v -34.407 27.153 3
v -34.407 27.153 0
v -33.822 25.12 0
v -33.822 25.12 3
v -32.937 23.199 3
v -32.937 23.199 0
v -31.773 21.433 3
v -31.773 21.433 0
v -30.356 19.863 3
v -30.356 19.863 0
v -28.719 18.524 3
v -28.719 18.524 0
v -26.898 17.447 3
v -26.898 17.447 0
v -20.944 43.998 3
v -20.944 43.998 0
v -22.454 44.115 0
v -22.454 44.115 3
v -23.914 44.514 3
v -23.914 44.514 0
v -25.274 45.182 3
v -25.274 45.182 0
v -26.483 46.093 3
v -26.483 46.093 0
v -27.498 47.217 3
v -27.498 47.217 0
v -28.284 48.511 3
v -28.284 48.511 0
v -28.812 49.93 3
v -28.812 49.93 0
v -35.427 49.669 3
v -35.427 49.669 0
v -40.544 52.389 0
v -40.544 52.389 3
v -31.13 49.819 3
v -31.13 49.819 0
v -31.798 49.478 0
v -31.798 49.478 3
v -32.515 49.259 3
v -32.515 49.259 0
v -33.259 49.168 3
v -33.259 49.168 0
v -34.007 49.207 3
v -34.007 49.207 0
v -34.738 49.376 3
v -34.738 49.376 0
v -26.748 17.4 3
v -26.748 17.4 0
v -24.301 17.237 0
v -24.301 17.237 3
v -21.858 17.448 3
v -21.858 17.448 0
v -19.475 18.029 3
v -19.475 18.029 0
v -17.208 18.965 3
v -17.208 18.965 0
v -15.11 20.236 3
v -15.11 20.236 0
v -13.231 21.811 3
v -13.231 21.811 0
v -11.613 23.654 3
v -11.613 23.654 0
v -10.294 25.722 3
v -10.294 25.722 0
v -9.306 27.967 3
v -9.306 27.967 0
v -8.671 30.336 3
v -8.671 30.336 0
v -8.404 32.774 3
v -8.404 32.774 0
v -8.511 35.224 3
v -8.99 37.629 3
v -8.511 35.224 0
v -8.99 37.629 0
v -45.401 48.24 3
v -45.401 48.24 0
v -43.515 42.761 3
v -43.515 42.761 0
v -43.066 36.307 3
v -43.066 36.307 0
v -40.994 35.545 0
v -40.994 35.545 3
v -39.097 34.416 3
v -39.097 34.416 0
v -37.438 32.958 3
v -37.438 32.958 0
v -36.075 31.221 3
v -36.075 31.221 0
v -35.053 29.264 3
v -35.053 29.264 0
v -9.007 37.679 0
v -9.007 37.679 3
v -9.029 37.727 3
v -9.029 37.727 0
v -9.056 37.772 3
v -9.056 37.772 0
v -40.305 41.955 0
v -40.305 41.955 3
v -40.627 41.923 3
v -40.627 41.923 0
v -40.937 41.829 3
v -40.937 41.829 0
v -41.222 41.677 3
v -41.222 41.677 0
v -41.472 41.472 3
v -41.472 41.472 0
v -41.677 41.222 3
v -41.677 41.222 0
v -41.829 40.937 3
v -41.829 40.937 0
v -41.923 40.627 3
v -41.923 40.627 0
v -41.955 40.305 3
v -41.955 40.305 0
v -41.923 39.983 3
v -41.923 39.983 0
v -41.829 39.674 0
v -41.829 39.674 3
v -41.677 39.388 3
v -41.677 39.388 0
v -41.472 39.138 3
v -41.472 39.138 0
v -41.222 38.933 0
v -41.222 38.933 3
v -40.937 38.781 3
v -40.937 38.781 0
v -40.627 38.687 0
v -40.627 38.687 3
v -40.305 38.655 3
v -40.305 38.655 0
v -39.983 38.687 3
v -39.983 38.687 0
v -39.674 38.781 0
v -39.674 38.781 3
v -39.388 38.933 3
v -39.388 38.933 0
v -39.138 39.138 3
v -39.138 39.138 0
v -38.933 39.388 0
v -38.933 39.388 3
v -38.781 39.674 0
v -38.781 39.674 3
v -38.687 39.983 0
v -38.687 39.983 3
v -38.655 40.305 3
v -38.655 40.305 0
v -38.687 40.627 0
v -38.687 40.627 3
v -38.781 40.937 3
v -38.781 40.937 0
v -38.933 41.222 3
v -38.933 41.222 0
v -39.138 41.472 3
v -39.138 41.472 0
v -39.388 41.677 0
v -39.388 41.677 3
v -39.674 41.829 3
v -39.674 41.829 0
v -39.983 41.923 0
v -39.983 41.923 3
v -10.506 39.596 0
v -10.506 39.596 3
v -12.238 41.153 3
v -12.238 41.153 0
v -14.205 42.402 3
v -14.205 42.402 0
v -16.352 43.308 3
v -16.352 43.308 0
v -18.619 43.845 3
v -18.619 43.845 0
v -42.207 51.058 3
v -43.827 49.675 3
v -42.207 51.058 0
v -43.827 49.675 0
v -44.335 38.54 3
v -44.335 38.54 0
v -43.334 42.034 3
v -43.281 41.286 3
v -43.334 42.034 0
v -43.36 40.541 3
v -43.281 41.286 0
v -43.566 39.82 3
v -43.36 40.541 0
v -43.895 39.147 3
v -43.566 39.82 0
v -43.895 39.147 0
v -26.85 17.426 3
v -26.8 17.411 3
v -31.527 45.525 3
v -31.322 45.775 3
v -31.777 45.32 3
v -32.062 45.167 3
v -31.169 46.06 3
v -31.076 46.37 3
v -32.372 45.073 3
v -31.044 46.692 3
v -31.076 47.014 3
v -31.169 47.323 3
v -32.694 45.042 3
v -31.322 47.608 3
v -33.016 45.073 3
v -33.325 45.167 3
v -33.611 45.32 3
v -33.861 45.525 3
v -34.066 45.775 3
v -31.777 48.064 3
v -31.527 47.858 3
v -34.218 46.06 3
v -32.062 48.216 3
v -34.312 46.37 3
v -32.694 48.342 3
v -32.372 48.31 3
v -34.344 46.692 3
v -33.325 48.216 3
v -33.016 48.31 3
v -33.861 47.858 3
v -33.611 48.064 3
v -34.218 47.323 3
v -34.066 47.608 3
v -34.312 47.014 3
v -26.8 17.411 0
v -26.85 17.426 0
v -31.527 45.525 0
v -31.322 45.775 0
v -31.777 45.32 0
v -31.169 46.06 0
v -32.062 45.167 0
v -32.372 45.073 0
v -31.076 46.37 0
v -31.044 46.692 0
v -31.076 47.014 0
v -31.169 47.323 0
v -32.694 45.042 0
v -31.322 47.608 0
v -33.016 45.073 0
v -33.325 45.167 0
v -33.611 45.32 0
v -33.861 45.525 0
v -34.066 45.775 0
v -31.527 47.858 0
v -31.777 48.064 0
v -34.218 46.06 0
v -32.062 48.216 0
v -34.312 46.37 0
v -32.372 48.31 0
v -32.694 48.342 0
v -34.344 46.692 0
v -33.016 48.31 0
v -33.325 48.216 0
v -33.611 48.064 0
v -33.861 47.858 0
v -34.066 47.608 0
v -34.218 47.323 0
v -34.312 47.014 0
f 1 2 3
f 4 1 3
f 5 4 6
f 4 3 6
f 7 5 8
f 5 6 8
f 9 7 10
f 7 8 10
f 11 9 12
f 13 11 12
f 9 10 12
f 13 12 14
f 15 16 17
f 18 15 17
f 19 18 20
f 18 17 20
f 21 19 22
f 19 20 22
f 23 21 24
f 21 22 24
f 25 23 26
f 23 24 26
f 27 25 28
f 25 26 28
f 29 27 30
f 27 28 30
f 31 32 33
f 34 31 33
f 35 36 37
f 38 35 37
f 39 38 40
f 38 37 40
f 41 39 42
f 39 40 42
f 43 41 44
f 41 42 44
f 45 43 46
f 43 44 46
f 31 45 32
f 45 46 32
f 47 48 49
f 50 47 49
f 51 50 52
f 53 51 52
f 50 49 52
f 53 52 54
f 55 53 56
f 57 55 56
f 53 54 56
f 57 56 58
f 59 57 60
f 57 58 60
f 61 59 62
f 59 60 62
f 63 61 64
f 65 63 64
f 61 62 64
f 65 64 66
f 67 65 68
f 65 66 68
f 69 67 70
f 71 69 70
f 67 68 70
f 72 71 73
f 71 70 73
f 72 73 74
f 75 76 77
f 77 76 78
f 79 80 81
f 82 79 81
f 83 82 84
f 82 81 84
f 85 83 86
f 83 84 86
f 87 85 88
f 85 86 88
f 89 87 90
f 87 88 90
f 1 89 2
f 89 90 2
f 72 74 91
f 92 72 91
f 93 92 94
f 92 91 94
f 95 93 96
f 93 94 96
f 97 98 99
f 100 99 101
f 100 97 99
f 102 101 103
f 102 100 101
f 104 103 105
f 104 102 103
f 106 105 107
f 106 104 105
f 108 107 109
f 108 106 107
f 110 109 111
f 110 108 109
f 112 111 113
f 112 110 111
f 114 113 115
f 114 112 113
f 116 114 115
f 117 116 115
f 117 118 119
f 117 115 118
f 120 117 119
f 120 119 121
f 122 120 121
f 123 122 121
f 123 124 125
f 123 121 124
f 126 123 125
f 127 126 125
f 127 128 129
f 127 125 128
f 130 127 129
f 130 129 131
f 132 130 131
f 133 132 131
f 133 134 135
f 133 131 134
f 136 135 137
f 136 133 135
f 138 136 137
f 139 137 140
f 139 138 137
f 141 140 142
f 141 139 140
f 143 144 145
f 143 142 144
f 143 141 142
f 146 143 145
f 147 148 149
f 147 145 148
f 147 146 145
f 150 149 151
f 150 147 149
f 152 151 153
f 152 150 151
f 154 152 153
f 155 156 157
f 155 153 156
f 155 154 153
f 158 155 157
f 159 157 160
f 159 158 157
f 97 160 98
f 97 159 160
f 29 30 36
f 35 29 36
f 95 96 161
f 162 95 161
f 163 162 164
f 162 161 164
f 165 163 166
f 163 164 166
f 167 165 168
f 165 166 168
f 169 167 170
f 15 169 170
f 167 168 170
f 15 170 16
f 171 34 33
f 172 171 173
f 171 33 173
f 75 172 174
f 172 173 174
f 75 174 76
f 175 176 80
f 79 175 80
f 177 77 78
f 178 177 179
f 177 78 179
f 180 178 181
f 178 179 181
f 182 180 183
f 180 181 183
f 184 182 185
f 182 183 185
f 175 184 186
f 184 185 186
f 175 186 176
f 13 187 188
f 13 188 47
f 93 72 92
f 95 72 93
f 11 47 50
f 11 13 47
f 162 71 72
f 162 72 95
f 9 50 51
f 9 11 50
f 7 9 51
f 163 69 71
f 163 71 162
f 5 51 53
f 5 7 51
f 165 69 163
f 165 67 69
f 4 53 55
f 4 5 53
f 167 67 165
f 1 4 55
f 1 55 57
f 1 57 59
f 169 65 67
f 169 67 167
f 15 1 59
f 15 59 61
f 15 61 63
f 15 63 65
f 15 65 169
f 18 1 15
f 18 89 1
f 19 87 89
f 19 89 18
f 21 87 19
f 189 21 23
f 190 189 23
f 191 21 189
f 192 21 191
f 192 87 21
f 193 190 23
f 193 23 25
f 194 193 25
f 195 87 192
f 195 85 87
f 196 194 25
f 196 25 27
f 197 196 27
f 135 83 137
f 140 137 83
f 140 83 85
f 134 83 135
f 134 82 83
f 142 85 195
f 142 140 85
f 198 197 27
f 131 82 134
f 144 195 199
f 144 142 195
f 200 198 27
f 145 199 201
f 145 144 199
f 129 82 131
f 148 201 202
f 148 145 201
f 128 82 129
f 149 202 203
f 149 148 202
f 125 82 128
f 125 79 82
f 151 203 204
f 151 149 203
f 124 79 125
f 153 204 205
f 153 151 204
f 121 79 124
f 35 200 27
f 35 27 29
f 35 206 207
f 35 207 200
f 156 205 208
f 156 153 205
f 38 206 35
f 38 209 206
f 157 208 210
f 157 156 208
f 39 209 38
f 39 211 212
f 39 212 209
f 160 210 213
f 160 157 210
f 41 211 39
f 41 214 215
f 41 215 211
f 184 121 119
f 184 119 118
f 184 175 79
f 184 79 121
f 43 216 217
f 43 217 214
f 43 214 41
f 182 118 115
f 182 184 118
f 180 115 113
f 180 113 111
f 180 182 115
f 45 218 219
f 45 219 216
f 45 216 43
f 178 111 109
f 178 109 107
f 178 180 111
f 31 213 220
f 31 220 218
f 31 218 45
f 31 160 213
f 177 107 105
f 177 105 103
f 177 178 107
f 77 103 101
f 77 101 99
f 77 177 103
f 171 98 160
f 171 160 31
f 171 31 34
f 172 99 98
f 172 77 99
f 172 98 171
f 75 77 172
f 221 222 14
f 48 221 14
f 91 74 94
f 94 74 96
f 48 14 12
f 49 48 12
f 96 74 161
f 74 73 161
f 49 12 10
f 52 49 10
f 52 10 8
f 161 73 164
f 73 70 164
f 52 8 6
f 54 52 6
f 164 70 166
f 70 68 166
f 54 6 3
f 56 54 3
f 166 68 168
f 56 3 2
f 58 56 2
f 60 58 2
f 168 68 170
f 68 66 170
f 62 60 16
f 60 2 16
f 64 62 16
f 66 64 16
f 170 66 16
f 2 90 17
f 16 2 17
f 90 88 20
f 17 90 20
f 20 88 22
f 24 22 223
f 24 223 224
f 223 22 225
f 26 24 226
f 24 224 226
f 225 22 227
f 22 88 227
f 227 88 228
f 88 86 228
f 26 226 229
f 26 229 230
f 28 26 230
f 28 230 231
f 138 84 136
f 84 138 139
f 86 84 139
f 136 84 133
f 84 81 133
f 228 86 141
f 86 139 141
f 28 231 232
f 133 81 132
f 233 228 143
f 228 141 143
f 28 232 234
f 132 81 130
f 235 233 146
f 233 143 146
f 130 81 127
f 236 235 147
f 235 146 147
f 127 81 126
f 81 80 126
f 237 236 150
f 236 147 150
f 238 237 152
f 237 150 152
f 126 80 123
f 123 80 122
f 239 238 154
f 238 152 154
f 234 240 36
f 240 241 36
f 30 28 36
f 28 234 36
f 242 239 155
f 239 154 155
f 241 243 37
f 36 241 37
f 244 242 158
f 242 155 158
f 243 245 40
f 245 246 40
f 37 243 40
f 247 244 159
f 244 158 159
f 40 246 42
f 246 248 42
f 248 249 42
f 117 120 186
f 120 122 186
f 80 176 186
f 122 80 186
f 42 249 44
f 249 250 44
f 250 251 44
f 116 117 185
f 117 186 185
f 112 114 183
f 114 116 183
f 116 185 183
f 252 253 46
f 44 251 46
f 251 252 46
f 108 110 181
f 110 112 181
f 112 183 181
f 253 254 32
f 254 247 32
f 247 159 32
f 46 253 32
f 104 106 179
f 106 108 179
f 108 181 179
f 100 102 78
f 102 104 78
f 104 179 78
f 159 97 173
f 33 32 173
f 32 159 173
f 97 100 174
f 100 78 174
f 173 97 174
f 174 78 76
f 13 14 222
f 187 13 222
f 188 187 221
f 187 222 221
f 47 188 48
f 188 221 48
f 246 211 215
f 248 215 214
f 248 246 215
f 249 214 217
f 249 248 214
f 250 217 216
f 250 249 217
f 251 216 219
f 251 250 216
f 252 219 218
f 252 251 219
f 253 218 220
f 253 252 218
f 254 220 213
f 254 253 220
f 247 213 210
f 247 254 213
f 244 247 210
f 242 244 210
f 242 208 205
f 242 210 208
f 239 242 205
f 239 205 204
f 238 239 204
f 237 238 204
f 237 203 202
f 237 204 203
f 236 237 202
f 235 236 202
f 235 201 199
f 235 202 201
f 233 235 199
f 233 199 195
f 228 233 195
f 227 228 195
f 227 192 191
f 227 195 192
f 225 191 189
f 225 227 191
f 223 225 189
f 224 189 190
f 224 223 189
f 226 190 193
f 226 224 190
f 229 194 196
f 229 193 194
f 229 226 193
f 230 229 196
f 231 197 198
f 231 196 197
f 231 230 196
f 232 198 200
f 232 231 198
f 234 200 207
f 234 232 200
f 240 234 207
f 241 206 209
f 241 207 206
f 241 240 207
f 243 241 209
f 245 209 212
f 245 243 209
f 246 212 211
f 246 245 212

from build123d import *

# Parameters (mm, degrees)
BOSS_EXTRUDE1_DEPTH     = 115
BOSS_EXTRUDE2_DEPTH     = 3
SKETCH4_R               = 1.65
CUT_EXTRUDE1_DEPTH      = 147.999004413
CUT_EXTRUDE2_DEPTH      = 147.999004413
CUT_EXTRUDE_THIN1_DEPTH = 147.999004413
CUT_EXTRUDE3_DEPTH      = 147.999004413


with BuildPart() as part:
    # Sketch1 → Boss-Extrude1 (new body)
    with BuildSketch(Plane(origin=(0, 0, 0), x_dir=(0, 1, 0), z_dir=(0, 0, 1))):
        with BuildLine():
            Line((66.793011614, 25.63943495), (62.125109481, 23.847595202))
            ThreePointArc((62.125109481, 23.847595202), (50.18784505, 43.696878999), (32.170193606, 58.252173078))
            Line((32.170193606, 58.252173078), (34.587369472, 62.629073903))
            ThreePointArc((34.587369472, 62.629073903), (53.95881545, 46.980136869), (66.793011614, 25.63943495))
        make_face()
    extrude(amount=BOSS_EXTRUDE1_DEPTH)

    # Sketch3 → Boss-Extrude2 (add)
    with BuildSketch(Plane(origin=(0, 0, 0), x_dir=(0, 1, 0), z_dir=(0, 0, 1))):
        with BuildLine():
            ThreePointArc((37.772226983, 9.055581263), (42.402339681, 14.205235152), (43.997873295, 20.944014808))
            ThreePointArc((43.997873295, 20.944014808), (49.930251766, 28.811968202), (58.997685125, 24.954578252))
            ThreePointArc((58.997685125, 24.954578252), (60.351321071, 23.807583941), (62.125109481, 23.847595202))
            ThreePointArc((62.125109481, 23.847595202), (50.18784505, 43.696878999), (32.170193606, 58.252173078))
            ThreePointArc((32.170193606, 58.252173078), (31.867825608, 56.602303211), (32.676329677, 55.132671232))
            ThreePointArc((32.676329677, 55.132671232), (36.307290349, 43.066223982), (27.152640183, 34.407390053))
            ThreePointArc((27.152640183, 34.407390053), (21.43315886, 31.77290535), (17.44684462, 26.898248947))
            ThreePointArc((17.44684462, 26.898248947), (17.417631935, 26.825058047), (17.400281887, 26.748186307))
            ThreePointArc((17.400281887, 26.748186307), (22.701893313, 12.386399614), (37.629460858, 8.989970916))
            ThreePointArc((37.629460858, 8.989970916), (37.70343721, 9.017133171), (37.772226983, 9.055581263))
        make_face()
    extrude(amount=BOSS_EXTRUDE2_DEPTH)

    # Sketch4 → Cut-Extrude1 (cut, through all)
    with BuildSketch(Plane(origin=(0, 0, 0), x_dir=(0, 1, 0), z_dir=(0, 0, 1))):
        with Locations((40.305086528, 40.305086528)):
            Circle(SKETCH4_R)
        with Locations((46.691666524, 32.693856872)):
            Circle(SKETCH4_R)
    extrude(amount=CUT_EXTRUDE1_DEPTH, mode=Mode.SUBTRACT)

    # Sketch6 → Cut-Extrude2 (cut, through all)
    with BuildSketch(Plane(origin=(0, 0, 0), x_dir=(0, 1, 0), z_dir=(0, 0, 1))):
        with BuildLine():
            Line((52.744660964, 40.57385568), (49.933401851, 35.286646265))
            ThreePointArc((49.933401851, 35.286646265), (50.072999838, 31.289082957), (53.604790209, 29.411196706))
            Line((53.604790209, 29.411196706), (59.589277435, 29.620179604))
            ThreePointArc((59.589277435, 29.620179604), (56.433360559, 35.263477438), (52.744660964, 40.57385568))
        make_face()
        with BuildLine():
            Line((38.577322779, 54.222017596), (37.434732749, 48.343901467))
            ThreePointArc((37.434732749, 48.343901467), (38.737005367, 44.561827164), (42.663514101, 43.798591183))
            Line((42.663514101, 43.798591183), (48.32540701, 45.748137255))
            ThreePointArc((48.32540701, 45.748137255), (43.657448084, 50.222149016), (38.577322779, 54.222017596))
        make_face()
    extrude(amount=CUT_EXTRUDE2_DEPTH, mode=Mode.SUBTRACT)

    # Sketch6<4> → Cut-Extrude-Thin1 (cut, through all)
    # profile 1 of 2: a face of its own
    with BuildSketch(Plane(origin=(0, 0, 0), x_dir=(0, 1, 0), z_dir=(0, 0, 1))):
        with BuildLine():
            Line((60.063470687, 29.336555934), (53.615260058, 29.111379457))
            ThreePointArc((53.615260058, 29.111379457), (49.818585409, 31.130107177), (49.668517573, 35.427487734))
            Line((49.668517573, 35.427487734), (52.697614338, 41.124390185))
            ThreePointArc((52.697614338, 41.124390185), (56.687774988, 35.422453218), (60.063470687, 29.336555934))
        make_face()
        with BuildLine():
            Line((59.589277435, 29.620179604), (53.604790209, 29.411196706))
            ThreePointArc((53.604790209, 29.411196706), (50.072999838, 31.289082957), (49.933401851, 35.286646265))
            Line((49.933401851, 35.286646265), (52.744660964, 40.57385568))
            ThreePointArc((52.744660964, 40.57385568), (56.433360559, 35.263477438), (59.589277435, 29.620179604))
        make_face(mode=Mode.SUBTRACT)
    # profile 2 of 2: a face of its own
    with BuildSketch(Plane(origin=(0, 0, 0), x_dir=(0, 1, 0), z_dir=(0, 0, 1))):
        with BuildLine():
            Line((48.861803808, 45.61554728), (42.761184547, 43.51493561))
            ThreePointArc((42.761184547, 43.51493561), (38.540187658, 44.33541429), (37.140244594, 48.401144165))
            Line((37.140244594, 48.401144165), (38.371371155, 54.734741259))
            ThreePointArc((38.371371155, 54.734741259), (43.854265793, 50.44856189), (48.861803808, 45.61554728))
        make_face()
        with BuildLine():
            Line((48.32540701, 45.748137255), (42.663514101, 43.798591183))
            ThreePointArc((42.663514101, 43.798591183), (38.737005367, 44.561827164), (37.434732749, 48.343901467))
            Line((37.434732749, 48.343901467), (38.577322779, 54.222017596))
            ThreePointArc((38.577322779, 54.222017596), (43.657448084, 50.222149016), (48.32540701, 45.748137255))
        make_face(mode=Mode.SUBTRACT)
    extrude(amount=CUT_EXTRUDE_THIN1_DEPTH, mode=Mode.SUBTRACT)

    # Sketch7 → Cut-Extrude3 (cut, through all)
    with BuildSketch(Plane(origin=(0, 0, 0), x_dir=(0, 1, 0), z_dir=(0, 0, 1))):
        with BuildLine():
            Line((48.240089186, 45.401473768), (38.540187658, 44.33541429))
            Line((38.540187658, 44.33541429), (36.307290349, 43.066223982))
            Line((36.307290349, 43.066223982), (22.600693744, 60.972682424))
            Line((22.600693744, 60.972682424), (52.388918832, 72.501111316))
            Line((52.388918832, 72.501111316), (73.007988399, 34.26459203))
            Line((73.007988399, 34.26459203), (68.951063276, 18.611622597))
            Line((68.951063276, 18.611622597), (52.388918832, 26.438107314))
            Line((52.388918832, 26.438107314), (49.930251766, 28.811968202))
            Line((49.930251766, 28.811968202), (49.818585409, 31.130107177))
            Line((49.818585409, 31.130107177), (52.388918832, 40.543818378))
            ThreePointArc((52.388918832, 40.543818378), (50.373093191, 43.022685962), (48.240089186, 45.401473768))
        make_face()
    extrude(amount=CUT_EXTRUDE3_DEPTH, mode=Mode.SUBTRACT)


solid = part.part
